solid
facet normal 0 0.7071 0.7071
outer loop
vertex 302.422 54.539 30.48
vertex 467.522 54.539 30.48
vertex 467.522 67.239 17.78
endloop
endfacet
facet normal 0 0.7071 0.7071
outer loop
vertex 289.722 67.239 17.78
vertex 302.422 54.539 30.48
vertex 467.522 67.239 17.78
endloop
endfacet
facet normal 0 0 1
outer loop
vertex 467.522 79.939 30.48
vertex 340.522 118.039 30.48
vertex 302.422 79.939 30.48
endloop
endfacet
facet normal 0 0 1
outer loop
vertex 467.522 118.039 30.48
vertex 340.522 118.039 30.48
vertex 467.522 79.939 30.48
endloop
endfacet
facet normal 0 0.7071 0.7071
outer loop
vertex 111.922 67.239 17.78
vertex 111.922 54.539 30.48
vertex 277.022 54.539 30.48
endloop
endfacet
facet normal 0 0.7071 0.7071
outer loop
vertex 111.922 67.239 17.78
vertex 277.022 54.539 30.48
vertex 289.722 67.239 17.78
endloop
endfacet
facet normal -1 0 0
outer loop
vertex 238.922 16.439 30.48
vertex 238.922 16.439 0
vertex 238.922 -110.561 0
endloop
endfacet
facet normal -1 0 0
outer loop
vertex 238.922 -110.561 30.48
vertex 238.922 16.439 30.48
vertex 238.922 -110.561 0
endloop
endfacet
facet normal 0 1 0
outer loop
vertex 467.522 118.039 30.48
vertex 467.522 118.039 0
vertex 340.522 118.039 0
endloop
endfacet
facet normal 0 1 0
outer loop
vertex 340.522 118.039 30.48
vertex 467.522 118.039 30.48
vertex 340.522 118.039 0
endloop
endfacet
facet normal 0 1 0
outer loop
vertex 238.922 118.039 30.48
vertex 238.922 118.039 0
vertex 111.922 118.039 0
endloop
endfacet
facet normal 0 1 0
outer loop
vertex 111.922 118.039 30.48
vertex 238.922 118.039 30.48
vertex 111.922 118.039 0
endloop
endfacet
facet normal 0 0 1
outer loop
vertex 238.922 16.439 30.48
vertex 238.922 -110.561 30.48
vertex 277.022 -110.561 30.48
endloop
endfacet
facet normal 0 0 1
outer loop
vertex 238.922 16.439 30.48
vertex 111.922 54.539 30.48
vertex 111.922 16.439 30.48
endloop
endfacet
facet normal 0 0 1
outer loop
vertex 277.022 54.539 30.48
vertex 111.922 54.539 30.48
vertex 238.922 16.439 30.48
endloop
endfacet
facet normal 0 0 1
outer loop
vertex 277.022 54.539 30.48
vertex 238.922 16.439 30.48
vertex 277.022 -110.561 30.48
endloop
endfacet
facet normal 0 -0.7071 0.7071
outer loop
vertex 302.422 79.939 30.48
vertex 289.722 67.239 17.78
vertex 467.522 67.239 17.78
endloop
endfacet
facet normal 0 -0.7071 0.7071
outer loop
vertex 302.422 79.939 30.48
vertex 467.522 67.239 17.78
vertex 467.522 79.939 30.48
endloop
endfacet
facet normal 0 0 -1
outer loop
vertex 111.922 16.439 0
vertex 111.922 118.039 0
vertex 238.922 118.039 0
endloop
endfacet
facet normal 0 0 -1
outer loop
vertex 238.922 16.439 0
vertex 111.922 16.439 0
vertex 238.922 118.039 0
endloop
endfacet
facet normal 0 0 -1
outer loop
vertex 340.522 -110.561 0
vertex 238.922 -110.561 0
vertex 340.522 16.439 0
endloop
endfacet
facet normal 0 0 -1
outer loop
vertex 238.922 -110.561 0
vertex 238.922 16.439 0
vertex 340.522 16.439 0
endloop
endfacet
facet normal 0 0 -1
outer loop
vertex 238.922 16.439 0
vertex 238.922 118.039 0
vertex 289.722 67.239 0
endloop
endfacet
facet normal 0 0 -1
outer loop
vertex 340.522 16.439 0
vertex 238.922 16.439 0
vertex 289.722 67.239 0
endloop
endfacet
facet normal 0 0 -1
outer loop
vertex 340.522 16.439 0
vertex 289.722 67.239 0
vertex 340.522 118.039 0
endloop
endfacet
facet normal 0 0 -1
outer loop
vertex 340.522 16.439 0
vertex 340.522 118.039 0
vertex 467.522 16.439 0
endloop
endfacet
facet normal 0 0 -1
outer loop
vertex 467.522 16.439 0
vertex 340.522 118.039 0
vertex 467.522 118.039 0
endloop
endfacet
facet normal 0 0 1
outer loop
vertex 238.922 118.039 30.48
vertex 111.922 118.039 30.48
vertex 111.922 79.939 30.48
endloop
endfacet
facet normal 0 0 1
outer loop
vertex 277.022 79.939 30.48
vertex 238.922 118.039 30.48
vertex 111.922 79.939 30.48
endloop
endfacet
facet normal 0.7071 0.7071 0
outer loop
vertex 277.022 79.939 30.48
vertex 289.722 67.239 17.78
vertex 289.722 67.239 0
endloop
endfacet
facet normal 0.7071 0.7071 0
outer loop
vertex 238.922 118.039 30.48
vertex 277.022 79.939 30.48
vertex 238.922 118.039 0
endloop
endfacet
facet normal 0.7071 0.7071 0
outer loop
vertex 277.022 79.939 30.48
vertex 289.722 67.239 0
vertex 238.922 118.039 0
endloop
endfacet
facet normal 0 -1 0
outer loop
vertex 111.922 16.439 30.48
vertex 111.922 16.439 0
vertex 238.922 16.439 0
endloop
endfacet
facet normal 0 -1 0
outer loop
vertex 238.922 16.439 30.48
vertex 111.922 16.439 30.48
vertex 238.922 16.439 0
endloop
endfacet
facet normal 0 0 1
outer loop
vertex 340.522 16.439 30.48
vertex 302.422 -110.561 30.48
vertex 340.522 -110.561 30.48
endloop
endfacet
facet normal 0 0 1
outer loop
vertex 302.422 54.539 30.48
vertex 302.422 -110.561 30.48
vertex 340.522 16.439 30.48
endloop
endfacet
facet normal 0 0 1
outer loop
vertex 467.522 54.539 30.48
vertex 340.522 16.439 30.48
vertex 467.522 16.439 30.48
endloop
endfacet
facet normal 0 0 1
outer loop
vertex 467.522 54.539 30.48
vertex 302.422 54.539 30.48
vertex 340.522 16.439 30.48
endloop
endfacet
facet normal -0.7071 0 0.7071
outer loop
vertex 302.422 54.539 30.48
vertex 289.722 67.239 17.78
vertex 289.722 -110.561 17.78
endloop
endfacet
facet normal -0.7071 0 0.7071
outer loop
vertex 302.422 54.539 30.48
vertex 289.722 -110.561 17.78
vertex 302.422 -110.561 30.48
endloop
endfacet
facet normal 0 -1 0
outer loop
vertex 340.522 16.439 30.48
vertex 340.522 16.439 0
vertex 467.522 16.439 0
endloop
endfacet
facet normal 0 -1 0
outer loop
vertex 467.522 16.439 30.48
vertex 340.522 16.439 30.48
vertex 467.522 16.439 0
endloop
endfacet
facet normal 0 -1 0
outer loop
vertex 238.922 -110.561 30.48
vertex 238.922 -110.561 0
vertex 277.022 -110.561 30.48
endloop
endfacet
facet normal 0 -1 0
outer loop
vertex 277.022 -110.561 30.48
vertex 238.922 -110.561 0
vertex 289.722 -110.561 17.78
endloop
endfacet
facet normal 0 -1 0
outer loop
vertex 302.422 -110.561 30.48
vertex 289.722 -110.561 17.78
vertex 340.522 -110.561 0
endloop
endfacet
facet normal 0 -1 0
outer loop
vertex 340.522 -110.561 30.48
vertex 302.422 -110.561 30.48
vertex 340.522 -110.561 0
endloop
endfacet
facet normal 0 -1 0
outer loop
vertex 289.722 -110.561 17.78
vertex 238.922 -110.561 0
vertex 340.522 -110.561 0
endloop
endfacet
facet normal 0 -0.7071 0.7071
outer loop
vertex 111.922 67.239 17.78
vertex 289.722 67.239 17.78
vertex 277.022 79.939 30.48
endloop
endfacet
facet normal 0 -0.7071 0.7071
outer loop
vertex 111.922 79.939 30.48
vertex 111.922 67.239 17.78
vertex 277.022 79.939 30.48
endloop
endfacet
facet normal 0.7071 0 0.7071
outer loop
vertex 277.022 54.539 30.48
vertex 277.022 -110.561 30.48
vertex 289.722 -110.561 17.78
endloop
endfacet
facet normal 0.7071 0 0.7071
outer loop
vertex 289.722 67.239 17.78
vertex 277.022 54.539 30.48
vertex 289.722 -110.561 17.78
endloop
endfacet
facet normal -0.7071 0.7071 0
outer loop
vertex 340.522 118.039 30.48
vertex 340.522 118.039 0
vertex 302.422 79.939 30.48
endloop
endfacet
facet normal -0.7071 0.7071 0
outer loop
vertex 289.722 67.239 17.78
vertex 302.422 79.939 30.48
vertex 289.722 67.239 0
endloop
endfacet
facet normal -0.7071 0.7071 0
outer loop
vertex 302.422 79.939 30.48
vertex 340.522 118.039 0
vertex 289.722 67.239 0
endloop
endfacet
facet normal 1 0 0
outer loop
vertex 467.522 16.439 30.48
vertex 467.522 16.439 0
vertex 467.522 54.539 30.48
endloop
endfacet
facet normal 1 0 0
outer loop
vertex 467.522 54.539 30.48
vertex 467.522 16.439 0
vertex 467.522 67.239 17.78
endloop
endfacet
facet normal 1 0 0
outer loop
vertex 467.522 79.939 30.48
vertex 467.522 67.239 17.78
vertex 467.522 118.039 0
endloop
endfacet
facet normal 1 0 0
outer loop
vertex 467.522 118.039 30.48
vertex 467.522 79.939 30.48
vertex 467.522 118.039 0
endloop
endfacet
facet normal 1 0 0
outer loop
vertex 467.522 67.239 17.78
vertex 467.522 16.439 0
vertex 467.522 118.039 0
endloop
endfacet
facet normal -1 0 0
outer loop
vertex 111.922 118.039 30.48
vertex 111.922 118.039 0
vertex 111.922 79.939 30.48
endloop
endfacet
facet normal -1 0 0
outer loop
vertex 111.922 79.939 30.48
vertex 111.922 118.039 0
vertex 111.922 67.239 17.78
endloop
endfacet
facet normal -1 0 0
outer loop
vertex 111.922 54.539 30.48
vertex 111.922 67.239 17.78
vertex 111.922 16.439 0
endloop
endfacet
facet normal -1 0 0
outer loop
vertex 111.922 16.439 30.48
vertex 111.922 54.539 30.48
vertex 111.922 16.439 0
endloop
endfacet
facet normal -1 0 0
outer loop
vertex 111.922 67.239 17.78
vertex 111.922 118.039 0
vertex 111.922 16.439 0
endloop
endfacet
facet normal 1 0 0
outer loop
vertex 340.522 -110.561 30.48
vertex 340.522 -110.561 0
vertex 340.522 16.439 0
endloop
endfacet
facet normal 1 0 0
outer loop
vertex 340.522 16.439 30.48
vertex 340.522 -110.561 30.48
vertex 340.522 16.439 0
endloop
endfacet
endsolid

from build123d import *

# Parameters (mm, degrees)
F1_DEPTH = 30.48
F3_DEPTH = 228.601
F5_DEPTH = 355.601


with BuildPart() as f1:
    # F0 (on Top) → F1 (new body)
    with BuildSketch(Plane.XY):
        Polygon((238.922207, -110.560542), (289.722207, -110.560542), (289.722207, 67.239458), (111.922207, 67.239458), (111.922207, 16.439458), (238.922207, 16.439458), align=None)
        Polygon((289.722207, 67.239458), (289.722207, -110.560542), (340.522207, -110.560542), (340.522207, 16.439458), (467.522207, 16.439458), (467.522207, 67.239458), align=None)
        Polygon((111.922207, 67.239458), (289.722207, 67.239458), (238.922207, 118.039458), (111.922207, 118.039458), align=None)
        Polygon((340.522207, 118.039458), (289.722207, 67.239458), (467.522207, 67.239458), (467.522207, 118.039458), align=None)
    extrude(amount=F1_DEPTH)

    # F2 (on face) → F3 (cut, through all)
    with BuildSketch(Plane.XZ.offset(110.560542)):
        Polygon((302.422207, 30.48), (277.022207, 30.48), (289.722207, 17.78), align=None)
    extrude(amount=-F3_DEPTH, mode=Mode.SUBTRACT)

    # F4 (on face) → F5 (cut, through all)
    with BuildSketch(Plane.YZ.offset(467.522207)):
        Polygon((67.239458, 17.78), (79.939458, 30.48), (54.539458, 30.48), align=None)
    extrude(amount=-F5_DEPTH, mode=Mode.SUBTRACT)


solid = f1.part
